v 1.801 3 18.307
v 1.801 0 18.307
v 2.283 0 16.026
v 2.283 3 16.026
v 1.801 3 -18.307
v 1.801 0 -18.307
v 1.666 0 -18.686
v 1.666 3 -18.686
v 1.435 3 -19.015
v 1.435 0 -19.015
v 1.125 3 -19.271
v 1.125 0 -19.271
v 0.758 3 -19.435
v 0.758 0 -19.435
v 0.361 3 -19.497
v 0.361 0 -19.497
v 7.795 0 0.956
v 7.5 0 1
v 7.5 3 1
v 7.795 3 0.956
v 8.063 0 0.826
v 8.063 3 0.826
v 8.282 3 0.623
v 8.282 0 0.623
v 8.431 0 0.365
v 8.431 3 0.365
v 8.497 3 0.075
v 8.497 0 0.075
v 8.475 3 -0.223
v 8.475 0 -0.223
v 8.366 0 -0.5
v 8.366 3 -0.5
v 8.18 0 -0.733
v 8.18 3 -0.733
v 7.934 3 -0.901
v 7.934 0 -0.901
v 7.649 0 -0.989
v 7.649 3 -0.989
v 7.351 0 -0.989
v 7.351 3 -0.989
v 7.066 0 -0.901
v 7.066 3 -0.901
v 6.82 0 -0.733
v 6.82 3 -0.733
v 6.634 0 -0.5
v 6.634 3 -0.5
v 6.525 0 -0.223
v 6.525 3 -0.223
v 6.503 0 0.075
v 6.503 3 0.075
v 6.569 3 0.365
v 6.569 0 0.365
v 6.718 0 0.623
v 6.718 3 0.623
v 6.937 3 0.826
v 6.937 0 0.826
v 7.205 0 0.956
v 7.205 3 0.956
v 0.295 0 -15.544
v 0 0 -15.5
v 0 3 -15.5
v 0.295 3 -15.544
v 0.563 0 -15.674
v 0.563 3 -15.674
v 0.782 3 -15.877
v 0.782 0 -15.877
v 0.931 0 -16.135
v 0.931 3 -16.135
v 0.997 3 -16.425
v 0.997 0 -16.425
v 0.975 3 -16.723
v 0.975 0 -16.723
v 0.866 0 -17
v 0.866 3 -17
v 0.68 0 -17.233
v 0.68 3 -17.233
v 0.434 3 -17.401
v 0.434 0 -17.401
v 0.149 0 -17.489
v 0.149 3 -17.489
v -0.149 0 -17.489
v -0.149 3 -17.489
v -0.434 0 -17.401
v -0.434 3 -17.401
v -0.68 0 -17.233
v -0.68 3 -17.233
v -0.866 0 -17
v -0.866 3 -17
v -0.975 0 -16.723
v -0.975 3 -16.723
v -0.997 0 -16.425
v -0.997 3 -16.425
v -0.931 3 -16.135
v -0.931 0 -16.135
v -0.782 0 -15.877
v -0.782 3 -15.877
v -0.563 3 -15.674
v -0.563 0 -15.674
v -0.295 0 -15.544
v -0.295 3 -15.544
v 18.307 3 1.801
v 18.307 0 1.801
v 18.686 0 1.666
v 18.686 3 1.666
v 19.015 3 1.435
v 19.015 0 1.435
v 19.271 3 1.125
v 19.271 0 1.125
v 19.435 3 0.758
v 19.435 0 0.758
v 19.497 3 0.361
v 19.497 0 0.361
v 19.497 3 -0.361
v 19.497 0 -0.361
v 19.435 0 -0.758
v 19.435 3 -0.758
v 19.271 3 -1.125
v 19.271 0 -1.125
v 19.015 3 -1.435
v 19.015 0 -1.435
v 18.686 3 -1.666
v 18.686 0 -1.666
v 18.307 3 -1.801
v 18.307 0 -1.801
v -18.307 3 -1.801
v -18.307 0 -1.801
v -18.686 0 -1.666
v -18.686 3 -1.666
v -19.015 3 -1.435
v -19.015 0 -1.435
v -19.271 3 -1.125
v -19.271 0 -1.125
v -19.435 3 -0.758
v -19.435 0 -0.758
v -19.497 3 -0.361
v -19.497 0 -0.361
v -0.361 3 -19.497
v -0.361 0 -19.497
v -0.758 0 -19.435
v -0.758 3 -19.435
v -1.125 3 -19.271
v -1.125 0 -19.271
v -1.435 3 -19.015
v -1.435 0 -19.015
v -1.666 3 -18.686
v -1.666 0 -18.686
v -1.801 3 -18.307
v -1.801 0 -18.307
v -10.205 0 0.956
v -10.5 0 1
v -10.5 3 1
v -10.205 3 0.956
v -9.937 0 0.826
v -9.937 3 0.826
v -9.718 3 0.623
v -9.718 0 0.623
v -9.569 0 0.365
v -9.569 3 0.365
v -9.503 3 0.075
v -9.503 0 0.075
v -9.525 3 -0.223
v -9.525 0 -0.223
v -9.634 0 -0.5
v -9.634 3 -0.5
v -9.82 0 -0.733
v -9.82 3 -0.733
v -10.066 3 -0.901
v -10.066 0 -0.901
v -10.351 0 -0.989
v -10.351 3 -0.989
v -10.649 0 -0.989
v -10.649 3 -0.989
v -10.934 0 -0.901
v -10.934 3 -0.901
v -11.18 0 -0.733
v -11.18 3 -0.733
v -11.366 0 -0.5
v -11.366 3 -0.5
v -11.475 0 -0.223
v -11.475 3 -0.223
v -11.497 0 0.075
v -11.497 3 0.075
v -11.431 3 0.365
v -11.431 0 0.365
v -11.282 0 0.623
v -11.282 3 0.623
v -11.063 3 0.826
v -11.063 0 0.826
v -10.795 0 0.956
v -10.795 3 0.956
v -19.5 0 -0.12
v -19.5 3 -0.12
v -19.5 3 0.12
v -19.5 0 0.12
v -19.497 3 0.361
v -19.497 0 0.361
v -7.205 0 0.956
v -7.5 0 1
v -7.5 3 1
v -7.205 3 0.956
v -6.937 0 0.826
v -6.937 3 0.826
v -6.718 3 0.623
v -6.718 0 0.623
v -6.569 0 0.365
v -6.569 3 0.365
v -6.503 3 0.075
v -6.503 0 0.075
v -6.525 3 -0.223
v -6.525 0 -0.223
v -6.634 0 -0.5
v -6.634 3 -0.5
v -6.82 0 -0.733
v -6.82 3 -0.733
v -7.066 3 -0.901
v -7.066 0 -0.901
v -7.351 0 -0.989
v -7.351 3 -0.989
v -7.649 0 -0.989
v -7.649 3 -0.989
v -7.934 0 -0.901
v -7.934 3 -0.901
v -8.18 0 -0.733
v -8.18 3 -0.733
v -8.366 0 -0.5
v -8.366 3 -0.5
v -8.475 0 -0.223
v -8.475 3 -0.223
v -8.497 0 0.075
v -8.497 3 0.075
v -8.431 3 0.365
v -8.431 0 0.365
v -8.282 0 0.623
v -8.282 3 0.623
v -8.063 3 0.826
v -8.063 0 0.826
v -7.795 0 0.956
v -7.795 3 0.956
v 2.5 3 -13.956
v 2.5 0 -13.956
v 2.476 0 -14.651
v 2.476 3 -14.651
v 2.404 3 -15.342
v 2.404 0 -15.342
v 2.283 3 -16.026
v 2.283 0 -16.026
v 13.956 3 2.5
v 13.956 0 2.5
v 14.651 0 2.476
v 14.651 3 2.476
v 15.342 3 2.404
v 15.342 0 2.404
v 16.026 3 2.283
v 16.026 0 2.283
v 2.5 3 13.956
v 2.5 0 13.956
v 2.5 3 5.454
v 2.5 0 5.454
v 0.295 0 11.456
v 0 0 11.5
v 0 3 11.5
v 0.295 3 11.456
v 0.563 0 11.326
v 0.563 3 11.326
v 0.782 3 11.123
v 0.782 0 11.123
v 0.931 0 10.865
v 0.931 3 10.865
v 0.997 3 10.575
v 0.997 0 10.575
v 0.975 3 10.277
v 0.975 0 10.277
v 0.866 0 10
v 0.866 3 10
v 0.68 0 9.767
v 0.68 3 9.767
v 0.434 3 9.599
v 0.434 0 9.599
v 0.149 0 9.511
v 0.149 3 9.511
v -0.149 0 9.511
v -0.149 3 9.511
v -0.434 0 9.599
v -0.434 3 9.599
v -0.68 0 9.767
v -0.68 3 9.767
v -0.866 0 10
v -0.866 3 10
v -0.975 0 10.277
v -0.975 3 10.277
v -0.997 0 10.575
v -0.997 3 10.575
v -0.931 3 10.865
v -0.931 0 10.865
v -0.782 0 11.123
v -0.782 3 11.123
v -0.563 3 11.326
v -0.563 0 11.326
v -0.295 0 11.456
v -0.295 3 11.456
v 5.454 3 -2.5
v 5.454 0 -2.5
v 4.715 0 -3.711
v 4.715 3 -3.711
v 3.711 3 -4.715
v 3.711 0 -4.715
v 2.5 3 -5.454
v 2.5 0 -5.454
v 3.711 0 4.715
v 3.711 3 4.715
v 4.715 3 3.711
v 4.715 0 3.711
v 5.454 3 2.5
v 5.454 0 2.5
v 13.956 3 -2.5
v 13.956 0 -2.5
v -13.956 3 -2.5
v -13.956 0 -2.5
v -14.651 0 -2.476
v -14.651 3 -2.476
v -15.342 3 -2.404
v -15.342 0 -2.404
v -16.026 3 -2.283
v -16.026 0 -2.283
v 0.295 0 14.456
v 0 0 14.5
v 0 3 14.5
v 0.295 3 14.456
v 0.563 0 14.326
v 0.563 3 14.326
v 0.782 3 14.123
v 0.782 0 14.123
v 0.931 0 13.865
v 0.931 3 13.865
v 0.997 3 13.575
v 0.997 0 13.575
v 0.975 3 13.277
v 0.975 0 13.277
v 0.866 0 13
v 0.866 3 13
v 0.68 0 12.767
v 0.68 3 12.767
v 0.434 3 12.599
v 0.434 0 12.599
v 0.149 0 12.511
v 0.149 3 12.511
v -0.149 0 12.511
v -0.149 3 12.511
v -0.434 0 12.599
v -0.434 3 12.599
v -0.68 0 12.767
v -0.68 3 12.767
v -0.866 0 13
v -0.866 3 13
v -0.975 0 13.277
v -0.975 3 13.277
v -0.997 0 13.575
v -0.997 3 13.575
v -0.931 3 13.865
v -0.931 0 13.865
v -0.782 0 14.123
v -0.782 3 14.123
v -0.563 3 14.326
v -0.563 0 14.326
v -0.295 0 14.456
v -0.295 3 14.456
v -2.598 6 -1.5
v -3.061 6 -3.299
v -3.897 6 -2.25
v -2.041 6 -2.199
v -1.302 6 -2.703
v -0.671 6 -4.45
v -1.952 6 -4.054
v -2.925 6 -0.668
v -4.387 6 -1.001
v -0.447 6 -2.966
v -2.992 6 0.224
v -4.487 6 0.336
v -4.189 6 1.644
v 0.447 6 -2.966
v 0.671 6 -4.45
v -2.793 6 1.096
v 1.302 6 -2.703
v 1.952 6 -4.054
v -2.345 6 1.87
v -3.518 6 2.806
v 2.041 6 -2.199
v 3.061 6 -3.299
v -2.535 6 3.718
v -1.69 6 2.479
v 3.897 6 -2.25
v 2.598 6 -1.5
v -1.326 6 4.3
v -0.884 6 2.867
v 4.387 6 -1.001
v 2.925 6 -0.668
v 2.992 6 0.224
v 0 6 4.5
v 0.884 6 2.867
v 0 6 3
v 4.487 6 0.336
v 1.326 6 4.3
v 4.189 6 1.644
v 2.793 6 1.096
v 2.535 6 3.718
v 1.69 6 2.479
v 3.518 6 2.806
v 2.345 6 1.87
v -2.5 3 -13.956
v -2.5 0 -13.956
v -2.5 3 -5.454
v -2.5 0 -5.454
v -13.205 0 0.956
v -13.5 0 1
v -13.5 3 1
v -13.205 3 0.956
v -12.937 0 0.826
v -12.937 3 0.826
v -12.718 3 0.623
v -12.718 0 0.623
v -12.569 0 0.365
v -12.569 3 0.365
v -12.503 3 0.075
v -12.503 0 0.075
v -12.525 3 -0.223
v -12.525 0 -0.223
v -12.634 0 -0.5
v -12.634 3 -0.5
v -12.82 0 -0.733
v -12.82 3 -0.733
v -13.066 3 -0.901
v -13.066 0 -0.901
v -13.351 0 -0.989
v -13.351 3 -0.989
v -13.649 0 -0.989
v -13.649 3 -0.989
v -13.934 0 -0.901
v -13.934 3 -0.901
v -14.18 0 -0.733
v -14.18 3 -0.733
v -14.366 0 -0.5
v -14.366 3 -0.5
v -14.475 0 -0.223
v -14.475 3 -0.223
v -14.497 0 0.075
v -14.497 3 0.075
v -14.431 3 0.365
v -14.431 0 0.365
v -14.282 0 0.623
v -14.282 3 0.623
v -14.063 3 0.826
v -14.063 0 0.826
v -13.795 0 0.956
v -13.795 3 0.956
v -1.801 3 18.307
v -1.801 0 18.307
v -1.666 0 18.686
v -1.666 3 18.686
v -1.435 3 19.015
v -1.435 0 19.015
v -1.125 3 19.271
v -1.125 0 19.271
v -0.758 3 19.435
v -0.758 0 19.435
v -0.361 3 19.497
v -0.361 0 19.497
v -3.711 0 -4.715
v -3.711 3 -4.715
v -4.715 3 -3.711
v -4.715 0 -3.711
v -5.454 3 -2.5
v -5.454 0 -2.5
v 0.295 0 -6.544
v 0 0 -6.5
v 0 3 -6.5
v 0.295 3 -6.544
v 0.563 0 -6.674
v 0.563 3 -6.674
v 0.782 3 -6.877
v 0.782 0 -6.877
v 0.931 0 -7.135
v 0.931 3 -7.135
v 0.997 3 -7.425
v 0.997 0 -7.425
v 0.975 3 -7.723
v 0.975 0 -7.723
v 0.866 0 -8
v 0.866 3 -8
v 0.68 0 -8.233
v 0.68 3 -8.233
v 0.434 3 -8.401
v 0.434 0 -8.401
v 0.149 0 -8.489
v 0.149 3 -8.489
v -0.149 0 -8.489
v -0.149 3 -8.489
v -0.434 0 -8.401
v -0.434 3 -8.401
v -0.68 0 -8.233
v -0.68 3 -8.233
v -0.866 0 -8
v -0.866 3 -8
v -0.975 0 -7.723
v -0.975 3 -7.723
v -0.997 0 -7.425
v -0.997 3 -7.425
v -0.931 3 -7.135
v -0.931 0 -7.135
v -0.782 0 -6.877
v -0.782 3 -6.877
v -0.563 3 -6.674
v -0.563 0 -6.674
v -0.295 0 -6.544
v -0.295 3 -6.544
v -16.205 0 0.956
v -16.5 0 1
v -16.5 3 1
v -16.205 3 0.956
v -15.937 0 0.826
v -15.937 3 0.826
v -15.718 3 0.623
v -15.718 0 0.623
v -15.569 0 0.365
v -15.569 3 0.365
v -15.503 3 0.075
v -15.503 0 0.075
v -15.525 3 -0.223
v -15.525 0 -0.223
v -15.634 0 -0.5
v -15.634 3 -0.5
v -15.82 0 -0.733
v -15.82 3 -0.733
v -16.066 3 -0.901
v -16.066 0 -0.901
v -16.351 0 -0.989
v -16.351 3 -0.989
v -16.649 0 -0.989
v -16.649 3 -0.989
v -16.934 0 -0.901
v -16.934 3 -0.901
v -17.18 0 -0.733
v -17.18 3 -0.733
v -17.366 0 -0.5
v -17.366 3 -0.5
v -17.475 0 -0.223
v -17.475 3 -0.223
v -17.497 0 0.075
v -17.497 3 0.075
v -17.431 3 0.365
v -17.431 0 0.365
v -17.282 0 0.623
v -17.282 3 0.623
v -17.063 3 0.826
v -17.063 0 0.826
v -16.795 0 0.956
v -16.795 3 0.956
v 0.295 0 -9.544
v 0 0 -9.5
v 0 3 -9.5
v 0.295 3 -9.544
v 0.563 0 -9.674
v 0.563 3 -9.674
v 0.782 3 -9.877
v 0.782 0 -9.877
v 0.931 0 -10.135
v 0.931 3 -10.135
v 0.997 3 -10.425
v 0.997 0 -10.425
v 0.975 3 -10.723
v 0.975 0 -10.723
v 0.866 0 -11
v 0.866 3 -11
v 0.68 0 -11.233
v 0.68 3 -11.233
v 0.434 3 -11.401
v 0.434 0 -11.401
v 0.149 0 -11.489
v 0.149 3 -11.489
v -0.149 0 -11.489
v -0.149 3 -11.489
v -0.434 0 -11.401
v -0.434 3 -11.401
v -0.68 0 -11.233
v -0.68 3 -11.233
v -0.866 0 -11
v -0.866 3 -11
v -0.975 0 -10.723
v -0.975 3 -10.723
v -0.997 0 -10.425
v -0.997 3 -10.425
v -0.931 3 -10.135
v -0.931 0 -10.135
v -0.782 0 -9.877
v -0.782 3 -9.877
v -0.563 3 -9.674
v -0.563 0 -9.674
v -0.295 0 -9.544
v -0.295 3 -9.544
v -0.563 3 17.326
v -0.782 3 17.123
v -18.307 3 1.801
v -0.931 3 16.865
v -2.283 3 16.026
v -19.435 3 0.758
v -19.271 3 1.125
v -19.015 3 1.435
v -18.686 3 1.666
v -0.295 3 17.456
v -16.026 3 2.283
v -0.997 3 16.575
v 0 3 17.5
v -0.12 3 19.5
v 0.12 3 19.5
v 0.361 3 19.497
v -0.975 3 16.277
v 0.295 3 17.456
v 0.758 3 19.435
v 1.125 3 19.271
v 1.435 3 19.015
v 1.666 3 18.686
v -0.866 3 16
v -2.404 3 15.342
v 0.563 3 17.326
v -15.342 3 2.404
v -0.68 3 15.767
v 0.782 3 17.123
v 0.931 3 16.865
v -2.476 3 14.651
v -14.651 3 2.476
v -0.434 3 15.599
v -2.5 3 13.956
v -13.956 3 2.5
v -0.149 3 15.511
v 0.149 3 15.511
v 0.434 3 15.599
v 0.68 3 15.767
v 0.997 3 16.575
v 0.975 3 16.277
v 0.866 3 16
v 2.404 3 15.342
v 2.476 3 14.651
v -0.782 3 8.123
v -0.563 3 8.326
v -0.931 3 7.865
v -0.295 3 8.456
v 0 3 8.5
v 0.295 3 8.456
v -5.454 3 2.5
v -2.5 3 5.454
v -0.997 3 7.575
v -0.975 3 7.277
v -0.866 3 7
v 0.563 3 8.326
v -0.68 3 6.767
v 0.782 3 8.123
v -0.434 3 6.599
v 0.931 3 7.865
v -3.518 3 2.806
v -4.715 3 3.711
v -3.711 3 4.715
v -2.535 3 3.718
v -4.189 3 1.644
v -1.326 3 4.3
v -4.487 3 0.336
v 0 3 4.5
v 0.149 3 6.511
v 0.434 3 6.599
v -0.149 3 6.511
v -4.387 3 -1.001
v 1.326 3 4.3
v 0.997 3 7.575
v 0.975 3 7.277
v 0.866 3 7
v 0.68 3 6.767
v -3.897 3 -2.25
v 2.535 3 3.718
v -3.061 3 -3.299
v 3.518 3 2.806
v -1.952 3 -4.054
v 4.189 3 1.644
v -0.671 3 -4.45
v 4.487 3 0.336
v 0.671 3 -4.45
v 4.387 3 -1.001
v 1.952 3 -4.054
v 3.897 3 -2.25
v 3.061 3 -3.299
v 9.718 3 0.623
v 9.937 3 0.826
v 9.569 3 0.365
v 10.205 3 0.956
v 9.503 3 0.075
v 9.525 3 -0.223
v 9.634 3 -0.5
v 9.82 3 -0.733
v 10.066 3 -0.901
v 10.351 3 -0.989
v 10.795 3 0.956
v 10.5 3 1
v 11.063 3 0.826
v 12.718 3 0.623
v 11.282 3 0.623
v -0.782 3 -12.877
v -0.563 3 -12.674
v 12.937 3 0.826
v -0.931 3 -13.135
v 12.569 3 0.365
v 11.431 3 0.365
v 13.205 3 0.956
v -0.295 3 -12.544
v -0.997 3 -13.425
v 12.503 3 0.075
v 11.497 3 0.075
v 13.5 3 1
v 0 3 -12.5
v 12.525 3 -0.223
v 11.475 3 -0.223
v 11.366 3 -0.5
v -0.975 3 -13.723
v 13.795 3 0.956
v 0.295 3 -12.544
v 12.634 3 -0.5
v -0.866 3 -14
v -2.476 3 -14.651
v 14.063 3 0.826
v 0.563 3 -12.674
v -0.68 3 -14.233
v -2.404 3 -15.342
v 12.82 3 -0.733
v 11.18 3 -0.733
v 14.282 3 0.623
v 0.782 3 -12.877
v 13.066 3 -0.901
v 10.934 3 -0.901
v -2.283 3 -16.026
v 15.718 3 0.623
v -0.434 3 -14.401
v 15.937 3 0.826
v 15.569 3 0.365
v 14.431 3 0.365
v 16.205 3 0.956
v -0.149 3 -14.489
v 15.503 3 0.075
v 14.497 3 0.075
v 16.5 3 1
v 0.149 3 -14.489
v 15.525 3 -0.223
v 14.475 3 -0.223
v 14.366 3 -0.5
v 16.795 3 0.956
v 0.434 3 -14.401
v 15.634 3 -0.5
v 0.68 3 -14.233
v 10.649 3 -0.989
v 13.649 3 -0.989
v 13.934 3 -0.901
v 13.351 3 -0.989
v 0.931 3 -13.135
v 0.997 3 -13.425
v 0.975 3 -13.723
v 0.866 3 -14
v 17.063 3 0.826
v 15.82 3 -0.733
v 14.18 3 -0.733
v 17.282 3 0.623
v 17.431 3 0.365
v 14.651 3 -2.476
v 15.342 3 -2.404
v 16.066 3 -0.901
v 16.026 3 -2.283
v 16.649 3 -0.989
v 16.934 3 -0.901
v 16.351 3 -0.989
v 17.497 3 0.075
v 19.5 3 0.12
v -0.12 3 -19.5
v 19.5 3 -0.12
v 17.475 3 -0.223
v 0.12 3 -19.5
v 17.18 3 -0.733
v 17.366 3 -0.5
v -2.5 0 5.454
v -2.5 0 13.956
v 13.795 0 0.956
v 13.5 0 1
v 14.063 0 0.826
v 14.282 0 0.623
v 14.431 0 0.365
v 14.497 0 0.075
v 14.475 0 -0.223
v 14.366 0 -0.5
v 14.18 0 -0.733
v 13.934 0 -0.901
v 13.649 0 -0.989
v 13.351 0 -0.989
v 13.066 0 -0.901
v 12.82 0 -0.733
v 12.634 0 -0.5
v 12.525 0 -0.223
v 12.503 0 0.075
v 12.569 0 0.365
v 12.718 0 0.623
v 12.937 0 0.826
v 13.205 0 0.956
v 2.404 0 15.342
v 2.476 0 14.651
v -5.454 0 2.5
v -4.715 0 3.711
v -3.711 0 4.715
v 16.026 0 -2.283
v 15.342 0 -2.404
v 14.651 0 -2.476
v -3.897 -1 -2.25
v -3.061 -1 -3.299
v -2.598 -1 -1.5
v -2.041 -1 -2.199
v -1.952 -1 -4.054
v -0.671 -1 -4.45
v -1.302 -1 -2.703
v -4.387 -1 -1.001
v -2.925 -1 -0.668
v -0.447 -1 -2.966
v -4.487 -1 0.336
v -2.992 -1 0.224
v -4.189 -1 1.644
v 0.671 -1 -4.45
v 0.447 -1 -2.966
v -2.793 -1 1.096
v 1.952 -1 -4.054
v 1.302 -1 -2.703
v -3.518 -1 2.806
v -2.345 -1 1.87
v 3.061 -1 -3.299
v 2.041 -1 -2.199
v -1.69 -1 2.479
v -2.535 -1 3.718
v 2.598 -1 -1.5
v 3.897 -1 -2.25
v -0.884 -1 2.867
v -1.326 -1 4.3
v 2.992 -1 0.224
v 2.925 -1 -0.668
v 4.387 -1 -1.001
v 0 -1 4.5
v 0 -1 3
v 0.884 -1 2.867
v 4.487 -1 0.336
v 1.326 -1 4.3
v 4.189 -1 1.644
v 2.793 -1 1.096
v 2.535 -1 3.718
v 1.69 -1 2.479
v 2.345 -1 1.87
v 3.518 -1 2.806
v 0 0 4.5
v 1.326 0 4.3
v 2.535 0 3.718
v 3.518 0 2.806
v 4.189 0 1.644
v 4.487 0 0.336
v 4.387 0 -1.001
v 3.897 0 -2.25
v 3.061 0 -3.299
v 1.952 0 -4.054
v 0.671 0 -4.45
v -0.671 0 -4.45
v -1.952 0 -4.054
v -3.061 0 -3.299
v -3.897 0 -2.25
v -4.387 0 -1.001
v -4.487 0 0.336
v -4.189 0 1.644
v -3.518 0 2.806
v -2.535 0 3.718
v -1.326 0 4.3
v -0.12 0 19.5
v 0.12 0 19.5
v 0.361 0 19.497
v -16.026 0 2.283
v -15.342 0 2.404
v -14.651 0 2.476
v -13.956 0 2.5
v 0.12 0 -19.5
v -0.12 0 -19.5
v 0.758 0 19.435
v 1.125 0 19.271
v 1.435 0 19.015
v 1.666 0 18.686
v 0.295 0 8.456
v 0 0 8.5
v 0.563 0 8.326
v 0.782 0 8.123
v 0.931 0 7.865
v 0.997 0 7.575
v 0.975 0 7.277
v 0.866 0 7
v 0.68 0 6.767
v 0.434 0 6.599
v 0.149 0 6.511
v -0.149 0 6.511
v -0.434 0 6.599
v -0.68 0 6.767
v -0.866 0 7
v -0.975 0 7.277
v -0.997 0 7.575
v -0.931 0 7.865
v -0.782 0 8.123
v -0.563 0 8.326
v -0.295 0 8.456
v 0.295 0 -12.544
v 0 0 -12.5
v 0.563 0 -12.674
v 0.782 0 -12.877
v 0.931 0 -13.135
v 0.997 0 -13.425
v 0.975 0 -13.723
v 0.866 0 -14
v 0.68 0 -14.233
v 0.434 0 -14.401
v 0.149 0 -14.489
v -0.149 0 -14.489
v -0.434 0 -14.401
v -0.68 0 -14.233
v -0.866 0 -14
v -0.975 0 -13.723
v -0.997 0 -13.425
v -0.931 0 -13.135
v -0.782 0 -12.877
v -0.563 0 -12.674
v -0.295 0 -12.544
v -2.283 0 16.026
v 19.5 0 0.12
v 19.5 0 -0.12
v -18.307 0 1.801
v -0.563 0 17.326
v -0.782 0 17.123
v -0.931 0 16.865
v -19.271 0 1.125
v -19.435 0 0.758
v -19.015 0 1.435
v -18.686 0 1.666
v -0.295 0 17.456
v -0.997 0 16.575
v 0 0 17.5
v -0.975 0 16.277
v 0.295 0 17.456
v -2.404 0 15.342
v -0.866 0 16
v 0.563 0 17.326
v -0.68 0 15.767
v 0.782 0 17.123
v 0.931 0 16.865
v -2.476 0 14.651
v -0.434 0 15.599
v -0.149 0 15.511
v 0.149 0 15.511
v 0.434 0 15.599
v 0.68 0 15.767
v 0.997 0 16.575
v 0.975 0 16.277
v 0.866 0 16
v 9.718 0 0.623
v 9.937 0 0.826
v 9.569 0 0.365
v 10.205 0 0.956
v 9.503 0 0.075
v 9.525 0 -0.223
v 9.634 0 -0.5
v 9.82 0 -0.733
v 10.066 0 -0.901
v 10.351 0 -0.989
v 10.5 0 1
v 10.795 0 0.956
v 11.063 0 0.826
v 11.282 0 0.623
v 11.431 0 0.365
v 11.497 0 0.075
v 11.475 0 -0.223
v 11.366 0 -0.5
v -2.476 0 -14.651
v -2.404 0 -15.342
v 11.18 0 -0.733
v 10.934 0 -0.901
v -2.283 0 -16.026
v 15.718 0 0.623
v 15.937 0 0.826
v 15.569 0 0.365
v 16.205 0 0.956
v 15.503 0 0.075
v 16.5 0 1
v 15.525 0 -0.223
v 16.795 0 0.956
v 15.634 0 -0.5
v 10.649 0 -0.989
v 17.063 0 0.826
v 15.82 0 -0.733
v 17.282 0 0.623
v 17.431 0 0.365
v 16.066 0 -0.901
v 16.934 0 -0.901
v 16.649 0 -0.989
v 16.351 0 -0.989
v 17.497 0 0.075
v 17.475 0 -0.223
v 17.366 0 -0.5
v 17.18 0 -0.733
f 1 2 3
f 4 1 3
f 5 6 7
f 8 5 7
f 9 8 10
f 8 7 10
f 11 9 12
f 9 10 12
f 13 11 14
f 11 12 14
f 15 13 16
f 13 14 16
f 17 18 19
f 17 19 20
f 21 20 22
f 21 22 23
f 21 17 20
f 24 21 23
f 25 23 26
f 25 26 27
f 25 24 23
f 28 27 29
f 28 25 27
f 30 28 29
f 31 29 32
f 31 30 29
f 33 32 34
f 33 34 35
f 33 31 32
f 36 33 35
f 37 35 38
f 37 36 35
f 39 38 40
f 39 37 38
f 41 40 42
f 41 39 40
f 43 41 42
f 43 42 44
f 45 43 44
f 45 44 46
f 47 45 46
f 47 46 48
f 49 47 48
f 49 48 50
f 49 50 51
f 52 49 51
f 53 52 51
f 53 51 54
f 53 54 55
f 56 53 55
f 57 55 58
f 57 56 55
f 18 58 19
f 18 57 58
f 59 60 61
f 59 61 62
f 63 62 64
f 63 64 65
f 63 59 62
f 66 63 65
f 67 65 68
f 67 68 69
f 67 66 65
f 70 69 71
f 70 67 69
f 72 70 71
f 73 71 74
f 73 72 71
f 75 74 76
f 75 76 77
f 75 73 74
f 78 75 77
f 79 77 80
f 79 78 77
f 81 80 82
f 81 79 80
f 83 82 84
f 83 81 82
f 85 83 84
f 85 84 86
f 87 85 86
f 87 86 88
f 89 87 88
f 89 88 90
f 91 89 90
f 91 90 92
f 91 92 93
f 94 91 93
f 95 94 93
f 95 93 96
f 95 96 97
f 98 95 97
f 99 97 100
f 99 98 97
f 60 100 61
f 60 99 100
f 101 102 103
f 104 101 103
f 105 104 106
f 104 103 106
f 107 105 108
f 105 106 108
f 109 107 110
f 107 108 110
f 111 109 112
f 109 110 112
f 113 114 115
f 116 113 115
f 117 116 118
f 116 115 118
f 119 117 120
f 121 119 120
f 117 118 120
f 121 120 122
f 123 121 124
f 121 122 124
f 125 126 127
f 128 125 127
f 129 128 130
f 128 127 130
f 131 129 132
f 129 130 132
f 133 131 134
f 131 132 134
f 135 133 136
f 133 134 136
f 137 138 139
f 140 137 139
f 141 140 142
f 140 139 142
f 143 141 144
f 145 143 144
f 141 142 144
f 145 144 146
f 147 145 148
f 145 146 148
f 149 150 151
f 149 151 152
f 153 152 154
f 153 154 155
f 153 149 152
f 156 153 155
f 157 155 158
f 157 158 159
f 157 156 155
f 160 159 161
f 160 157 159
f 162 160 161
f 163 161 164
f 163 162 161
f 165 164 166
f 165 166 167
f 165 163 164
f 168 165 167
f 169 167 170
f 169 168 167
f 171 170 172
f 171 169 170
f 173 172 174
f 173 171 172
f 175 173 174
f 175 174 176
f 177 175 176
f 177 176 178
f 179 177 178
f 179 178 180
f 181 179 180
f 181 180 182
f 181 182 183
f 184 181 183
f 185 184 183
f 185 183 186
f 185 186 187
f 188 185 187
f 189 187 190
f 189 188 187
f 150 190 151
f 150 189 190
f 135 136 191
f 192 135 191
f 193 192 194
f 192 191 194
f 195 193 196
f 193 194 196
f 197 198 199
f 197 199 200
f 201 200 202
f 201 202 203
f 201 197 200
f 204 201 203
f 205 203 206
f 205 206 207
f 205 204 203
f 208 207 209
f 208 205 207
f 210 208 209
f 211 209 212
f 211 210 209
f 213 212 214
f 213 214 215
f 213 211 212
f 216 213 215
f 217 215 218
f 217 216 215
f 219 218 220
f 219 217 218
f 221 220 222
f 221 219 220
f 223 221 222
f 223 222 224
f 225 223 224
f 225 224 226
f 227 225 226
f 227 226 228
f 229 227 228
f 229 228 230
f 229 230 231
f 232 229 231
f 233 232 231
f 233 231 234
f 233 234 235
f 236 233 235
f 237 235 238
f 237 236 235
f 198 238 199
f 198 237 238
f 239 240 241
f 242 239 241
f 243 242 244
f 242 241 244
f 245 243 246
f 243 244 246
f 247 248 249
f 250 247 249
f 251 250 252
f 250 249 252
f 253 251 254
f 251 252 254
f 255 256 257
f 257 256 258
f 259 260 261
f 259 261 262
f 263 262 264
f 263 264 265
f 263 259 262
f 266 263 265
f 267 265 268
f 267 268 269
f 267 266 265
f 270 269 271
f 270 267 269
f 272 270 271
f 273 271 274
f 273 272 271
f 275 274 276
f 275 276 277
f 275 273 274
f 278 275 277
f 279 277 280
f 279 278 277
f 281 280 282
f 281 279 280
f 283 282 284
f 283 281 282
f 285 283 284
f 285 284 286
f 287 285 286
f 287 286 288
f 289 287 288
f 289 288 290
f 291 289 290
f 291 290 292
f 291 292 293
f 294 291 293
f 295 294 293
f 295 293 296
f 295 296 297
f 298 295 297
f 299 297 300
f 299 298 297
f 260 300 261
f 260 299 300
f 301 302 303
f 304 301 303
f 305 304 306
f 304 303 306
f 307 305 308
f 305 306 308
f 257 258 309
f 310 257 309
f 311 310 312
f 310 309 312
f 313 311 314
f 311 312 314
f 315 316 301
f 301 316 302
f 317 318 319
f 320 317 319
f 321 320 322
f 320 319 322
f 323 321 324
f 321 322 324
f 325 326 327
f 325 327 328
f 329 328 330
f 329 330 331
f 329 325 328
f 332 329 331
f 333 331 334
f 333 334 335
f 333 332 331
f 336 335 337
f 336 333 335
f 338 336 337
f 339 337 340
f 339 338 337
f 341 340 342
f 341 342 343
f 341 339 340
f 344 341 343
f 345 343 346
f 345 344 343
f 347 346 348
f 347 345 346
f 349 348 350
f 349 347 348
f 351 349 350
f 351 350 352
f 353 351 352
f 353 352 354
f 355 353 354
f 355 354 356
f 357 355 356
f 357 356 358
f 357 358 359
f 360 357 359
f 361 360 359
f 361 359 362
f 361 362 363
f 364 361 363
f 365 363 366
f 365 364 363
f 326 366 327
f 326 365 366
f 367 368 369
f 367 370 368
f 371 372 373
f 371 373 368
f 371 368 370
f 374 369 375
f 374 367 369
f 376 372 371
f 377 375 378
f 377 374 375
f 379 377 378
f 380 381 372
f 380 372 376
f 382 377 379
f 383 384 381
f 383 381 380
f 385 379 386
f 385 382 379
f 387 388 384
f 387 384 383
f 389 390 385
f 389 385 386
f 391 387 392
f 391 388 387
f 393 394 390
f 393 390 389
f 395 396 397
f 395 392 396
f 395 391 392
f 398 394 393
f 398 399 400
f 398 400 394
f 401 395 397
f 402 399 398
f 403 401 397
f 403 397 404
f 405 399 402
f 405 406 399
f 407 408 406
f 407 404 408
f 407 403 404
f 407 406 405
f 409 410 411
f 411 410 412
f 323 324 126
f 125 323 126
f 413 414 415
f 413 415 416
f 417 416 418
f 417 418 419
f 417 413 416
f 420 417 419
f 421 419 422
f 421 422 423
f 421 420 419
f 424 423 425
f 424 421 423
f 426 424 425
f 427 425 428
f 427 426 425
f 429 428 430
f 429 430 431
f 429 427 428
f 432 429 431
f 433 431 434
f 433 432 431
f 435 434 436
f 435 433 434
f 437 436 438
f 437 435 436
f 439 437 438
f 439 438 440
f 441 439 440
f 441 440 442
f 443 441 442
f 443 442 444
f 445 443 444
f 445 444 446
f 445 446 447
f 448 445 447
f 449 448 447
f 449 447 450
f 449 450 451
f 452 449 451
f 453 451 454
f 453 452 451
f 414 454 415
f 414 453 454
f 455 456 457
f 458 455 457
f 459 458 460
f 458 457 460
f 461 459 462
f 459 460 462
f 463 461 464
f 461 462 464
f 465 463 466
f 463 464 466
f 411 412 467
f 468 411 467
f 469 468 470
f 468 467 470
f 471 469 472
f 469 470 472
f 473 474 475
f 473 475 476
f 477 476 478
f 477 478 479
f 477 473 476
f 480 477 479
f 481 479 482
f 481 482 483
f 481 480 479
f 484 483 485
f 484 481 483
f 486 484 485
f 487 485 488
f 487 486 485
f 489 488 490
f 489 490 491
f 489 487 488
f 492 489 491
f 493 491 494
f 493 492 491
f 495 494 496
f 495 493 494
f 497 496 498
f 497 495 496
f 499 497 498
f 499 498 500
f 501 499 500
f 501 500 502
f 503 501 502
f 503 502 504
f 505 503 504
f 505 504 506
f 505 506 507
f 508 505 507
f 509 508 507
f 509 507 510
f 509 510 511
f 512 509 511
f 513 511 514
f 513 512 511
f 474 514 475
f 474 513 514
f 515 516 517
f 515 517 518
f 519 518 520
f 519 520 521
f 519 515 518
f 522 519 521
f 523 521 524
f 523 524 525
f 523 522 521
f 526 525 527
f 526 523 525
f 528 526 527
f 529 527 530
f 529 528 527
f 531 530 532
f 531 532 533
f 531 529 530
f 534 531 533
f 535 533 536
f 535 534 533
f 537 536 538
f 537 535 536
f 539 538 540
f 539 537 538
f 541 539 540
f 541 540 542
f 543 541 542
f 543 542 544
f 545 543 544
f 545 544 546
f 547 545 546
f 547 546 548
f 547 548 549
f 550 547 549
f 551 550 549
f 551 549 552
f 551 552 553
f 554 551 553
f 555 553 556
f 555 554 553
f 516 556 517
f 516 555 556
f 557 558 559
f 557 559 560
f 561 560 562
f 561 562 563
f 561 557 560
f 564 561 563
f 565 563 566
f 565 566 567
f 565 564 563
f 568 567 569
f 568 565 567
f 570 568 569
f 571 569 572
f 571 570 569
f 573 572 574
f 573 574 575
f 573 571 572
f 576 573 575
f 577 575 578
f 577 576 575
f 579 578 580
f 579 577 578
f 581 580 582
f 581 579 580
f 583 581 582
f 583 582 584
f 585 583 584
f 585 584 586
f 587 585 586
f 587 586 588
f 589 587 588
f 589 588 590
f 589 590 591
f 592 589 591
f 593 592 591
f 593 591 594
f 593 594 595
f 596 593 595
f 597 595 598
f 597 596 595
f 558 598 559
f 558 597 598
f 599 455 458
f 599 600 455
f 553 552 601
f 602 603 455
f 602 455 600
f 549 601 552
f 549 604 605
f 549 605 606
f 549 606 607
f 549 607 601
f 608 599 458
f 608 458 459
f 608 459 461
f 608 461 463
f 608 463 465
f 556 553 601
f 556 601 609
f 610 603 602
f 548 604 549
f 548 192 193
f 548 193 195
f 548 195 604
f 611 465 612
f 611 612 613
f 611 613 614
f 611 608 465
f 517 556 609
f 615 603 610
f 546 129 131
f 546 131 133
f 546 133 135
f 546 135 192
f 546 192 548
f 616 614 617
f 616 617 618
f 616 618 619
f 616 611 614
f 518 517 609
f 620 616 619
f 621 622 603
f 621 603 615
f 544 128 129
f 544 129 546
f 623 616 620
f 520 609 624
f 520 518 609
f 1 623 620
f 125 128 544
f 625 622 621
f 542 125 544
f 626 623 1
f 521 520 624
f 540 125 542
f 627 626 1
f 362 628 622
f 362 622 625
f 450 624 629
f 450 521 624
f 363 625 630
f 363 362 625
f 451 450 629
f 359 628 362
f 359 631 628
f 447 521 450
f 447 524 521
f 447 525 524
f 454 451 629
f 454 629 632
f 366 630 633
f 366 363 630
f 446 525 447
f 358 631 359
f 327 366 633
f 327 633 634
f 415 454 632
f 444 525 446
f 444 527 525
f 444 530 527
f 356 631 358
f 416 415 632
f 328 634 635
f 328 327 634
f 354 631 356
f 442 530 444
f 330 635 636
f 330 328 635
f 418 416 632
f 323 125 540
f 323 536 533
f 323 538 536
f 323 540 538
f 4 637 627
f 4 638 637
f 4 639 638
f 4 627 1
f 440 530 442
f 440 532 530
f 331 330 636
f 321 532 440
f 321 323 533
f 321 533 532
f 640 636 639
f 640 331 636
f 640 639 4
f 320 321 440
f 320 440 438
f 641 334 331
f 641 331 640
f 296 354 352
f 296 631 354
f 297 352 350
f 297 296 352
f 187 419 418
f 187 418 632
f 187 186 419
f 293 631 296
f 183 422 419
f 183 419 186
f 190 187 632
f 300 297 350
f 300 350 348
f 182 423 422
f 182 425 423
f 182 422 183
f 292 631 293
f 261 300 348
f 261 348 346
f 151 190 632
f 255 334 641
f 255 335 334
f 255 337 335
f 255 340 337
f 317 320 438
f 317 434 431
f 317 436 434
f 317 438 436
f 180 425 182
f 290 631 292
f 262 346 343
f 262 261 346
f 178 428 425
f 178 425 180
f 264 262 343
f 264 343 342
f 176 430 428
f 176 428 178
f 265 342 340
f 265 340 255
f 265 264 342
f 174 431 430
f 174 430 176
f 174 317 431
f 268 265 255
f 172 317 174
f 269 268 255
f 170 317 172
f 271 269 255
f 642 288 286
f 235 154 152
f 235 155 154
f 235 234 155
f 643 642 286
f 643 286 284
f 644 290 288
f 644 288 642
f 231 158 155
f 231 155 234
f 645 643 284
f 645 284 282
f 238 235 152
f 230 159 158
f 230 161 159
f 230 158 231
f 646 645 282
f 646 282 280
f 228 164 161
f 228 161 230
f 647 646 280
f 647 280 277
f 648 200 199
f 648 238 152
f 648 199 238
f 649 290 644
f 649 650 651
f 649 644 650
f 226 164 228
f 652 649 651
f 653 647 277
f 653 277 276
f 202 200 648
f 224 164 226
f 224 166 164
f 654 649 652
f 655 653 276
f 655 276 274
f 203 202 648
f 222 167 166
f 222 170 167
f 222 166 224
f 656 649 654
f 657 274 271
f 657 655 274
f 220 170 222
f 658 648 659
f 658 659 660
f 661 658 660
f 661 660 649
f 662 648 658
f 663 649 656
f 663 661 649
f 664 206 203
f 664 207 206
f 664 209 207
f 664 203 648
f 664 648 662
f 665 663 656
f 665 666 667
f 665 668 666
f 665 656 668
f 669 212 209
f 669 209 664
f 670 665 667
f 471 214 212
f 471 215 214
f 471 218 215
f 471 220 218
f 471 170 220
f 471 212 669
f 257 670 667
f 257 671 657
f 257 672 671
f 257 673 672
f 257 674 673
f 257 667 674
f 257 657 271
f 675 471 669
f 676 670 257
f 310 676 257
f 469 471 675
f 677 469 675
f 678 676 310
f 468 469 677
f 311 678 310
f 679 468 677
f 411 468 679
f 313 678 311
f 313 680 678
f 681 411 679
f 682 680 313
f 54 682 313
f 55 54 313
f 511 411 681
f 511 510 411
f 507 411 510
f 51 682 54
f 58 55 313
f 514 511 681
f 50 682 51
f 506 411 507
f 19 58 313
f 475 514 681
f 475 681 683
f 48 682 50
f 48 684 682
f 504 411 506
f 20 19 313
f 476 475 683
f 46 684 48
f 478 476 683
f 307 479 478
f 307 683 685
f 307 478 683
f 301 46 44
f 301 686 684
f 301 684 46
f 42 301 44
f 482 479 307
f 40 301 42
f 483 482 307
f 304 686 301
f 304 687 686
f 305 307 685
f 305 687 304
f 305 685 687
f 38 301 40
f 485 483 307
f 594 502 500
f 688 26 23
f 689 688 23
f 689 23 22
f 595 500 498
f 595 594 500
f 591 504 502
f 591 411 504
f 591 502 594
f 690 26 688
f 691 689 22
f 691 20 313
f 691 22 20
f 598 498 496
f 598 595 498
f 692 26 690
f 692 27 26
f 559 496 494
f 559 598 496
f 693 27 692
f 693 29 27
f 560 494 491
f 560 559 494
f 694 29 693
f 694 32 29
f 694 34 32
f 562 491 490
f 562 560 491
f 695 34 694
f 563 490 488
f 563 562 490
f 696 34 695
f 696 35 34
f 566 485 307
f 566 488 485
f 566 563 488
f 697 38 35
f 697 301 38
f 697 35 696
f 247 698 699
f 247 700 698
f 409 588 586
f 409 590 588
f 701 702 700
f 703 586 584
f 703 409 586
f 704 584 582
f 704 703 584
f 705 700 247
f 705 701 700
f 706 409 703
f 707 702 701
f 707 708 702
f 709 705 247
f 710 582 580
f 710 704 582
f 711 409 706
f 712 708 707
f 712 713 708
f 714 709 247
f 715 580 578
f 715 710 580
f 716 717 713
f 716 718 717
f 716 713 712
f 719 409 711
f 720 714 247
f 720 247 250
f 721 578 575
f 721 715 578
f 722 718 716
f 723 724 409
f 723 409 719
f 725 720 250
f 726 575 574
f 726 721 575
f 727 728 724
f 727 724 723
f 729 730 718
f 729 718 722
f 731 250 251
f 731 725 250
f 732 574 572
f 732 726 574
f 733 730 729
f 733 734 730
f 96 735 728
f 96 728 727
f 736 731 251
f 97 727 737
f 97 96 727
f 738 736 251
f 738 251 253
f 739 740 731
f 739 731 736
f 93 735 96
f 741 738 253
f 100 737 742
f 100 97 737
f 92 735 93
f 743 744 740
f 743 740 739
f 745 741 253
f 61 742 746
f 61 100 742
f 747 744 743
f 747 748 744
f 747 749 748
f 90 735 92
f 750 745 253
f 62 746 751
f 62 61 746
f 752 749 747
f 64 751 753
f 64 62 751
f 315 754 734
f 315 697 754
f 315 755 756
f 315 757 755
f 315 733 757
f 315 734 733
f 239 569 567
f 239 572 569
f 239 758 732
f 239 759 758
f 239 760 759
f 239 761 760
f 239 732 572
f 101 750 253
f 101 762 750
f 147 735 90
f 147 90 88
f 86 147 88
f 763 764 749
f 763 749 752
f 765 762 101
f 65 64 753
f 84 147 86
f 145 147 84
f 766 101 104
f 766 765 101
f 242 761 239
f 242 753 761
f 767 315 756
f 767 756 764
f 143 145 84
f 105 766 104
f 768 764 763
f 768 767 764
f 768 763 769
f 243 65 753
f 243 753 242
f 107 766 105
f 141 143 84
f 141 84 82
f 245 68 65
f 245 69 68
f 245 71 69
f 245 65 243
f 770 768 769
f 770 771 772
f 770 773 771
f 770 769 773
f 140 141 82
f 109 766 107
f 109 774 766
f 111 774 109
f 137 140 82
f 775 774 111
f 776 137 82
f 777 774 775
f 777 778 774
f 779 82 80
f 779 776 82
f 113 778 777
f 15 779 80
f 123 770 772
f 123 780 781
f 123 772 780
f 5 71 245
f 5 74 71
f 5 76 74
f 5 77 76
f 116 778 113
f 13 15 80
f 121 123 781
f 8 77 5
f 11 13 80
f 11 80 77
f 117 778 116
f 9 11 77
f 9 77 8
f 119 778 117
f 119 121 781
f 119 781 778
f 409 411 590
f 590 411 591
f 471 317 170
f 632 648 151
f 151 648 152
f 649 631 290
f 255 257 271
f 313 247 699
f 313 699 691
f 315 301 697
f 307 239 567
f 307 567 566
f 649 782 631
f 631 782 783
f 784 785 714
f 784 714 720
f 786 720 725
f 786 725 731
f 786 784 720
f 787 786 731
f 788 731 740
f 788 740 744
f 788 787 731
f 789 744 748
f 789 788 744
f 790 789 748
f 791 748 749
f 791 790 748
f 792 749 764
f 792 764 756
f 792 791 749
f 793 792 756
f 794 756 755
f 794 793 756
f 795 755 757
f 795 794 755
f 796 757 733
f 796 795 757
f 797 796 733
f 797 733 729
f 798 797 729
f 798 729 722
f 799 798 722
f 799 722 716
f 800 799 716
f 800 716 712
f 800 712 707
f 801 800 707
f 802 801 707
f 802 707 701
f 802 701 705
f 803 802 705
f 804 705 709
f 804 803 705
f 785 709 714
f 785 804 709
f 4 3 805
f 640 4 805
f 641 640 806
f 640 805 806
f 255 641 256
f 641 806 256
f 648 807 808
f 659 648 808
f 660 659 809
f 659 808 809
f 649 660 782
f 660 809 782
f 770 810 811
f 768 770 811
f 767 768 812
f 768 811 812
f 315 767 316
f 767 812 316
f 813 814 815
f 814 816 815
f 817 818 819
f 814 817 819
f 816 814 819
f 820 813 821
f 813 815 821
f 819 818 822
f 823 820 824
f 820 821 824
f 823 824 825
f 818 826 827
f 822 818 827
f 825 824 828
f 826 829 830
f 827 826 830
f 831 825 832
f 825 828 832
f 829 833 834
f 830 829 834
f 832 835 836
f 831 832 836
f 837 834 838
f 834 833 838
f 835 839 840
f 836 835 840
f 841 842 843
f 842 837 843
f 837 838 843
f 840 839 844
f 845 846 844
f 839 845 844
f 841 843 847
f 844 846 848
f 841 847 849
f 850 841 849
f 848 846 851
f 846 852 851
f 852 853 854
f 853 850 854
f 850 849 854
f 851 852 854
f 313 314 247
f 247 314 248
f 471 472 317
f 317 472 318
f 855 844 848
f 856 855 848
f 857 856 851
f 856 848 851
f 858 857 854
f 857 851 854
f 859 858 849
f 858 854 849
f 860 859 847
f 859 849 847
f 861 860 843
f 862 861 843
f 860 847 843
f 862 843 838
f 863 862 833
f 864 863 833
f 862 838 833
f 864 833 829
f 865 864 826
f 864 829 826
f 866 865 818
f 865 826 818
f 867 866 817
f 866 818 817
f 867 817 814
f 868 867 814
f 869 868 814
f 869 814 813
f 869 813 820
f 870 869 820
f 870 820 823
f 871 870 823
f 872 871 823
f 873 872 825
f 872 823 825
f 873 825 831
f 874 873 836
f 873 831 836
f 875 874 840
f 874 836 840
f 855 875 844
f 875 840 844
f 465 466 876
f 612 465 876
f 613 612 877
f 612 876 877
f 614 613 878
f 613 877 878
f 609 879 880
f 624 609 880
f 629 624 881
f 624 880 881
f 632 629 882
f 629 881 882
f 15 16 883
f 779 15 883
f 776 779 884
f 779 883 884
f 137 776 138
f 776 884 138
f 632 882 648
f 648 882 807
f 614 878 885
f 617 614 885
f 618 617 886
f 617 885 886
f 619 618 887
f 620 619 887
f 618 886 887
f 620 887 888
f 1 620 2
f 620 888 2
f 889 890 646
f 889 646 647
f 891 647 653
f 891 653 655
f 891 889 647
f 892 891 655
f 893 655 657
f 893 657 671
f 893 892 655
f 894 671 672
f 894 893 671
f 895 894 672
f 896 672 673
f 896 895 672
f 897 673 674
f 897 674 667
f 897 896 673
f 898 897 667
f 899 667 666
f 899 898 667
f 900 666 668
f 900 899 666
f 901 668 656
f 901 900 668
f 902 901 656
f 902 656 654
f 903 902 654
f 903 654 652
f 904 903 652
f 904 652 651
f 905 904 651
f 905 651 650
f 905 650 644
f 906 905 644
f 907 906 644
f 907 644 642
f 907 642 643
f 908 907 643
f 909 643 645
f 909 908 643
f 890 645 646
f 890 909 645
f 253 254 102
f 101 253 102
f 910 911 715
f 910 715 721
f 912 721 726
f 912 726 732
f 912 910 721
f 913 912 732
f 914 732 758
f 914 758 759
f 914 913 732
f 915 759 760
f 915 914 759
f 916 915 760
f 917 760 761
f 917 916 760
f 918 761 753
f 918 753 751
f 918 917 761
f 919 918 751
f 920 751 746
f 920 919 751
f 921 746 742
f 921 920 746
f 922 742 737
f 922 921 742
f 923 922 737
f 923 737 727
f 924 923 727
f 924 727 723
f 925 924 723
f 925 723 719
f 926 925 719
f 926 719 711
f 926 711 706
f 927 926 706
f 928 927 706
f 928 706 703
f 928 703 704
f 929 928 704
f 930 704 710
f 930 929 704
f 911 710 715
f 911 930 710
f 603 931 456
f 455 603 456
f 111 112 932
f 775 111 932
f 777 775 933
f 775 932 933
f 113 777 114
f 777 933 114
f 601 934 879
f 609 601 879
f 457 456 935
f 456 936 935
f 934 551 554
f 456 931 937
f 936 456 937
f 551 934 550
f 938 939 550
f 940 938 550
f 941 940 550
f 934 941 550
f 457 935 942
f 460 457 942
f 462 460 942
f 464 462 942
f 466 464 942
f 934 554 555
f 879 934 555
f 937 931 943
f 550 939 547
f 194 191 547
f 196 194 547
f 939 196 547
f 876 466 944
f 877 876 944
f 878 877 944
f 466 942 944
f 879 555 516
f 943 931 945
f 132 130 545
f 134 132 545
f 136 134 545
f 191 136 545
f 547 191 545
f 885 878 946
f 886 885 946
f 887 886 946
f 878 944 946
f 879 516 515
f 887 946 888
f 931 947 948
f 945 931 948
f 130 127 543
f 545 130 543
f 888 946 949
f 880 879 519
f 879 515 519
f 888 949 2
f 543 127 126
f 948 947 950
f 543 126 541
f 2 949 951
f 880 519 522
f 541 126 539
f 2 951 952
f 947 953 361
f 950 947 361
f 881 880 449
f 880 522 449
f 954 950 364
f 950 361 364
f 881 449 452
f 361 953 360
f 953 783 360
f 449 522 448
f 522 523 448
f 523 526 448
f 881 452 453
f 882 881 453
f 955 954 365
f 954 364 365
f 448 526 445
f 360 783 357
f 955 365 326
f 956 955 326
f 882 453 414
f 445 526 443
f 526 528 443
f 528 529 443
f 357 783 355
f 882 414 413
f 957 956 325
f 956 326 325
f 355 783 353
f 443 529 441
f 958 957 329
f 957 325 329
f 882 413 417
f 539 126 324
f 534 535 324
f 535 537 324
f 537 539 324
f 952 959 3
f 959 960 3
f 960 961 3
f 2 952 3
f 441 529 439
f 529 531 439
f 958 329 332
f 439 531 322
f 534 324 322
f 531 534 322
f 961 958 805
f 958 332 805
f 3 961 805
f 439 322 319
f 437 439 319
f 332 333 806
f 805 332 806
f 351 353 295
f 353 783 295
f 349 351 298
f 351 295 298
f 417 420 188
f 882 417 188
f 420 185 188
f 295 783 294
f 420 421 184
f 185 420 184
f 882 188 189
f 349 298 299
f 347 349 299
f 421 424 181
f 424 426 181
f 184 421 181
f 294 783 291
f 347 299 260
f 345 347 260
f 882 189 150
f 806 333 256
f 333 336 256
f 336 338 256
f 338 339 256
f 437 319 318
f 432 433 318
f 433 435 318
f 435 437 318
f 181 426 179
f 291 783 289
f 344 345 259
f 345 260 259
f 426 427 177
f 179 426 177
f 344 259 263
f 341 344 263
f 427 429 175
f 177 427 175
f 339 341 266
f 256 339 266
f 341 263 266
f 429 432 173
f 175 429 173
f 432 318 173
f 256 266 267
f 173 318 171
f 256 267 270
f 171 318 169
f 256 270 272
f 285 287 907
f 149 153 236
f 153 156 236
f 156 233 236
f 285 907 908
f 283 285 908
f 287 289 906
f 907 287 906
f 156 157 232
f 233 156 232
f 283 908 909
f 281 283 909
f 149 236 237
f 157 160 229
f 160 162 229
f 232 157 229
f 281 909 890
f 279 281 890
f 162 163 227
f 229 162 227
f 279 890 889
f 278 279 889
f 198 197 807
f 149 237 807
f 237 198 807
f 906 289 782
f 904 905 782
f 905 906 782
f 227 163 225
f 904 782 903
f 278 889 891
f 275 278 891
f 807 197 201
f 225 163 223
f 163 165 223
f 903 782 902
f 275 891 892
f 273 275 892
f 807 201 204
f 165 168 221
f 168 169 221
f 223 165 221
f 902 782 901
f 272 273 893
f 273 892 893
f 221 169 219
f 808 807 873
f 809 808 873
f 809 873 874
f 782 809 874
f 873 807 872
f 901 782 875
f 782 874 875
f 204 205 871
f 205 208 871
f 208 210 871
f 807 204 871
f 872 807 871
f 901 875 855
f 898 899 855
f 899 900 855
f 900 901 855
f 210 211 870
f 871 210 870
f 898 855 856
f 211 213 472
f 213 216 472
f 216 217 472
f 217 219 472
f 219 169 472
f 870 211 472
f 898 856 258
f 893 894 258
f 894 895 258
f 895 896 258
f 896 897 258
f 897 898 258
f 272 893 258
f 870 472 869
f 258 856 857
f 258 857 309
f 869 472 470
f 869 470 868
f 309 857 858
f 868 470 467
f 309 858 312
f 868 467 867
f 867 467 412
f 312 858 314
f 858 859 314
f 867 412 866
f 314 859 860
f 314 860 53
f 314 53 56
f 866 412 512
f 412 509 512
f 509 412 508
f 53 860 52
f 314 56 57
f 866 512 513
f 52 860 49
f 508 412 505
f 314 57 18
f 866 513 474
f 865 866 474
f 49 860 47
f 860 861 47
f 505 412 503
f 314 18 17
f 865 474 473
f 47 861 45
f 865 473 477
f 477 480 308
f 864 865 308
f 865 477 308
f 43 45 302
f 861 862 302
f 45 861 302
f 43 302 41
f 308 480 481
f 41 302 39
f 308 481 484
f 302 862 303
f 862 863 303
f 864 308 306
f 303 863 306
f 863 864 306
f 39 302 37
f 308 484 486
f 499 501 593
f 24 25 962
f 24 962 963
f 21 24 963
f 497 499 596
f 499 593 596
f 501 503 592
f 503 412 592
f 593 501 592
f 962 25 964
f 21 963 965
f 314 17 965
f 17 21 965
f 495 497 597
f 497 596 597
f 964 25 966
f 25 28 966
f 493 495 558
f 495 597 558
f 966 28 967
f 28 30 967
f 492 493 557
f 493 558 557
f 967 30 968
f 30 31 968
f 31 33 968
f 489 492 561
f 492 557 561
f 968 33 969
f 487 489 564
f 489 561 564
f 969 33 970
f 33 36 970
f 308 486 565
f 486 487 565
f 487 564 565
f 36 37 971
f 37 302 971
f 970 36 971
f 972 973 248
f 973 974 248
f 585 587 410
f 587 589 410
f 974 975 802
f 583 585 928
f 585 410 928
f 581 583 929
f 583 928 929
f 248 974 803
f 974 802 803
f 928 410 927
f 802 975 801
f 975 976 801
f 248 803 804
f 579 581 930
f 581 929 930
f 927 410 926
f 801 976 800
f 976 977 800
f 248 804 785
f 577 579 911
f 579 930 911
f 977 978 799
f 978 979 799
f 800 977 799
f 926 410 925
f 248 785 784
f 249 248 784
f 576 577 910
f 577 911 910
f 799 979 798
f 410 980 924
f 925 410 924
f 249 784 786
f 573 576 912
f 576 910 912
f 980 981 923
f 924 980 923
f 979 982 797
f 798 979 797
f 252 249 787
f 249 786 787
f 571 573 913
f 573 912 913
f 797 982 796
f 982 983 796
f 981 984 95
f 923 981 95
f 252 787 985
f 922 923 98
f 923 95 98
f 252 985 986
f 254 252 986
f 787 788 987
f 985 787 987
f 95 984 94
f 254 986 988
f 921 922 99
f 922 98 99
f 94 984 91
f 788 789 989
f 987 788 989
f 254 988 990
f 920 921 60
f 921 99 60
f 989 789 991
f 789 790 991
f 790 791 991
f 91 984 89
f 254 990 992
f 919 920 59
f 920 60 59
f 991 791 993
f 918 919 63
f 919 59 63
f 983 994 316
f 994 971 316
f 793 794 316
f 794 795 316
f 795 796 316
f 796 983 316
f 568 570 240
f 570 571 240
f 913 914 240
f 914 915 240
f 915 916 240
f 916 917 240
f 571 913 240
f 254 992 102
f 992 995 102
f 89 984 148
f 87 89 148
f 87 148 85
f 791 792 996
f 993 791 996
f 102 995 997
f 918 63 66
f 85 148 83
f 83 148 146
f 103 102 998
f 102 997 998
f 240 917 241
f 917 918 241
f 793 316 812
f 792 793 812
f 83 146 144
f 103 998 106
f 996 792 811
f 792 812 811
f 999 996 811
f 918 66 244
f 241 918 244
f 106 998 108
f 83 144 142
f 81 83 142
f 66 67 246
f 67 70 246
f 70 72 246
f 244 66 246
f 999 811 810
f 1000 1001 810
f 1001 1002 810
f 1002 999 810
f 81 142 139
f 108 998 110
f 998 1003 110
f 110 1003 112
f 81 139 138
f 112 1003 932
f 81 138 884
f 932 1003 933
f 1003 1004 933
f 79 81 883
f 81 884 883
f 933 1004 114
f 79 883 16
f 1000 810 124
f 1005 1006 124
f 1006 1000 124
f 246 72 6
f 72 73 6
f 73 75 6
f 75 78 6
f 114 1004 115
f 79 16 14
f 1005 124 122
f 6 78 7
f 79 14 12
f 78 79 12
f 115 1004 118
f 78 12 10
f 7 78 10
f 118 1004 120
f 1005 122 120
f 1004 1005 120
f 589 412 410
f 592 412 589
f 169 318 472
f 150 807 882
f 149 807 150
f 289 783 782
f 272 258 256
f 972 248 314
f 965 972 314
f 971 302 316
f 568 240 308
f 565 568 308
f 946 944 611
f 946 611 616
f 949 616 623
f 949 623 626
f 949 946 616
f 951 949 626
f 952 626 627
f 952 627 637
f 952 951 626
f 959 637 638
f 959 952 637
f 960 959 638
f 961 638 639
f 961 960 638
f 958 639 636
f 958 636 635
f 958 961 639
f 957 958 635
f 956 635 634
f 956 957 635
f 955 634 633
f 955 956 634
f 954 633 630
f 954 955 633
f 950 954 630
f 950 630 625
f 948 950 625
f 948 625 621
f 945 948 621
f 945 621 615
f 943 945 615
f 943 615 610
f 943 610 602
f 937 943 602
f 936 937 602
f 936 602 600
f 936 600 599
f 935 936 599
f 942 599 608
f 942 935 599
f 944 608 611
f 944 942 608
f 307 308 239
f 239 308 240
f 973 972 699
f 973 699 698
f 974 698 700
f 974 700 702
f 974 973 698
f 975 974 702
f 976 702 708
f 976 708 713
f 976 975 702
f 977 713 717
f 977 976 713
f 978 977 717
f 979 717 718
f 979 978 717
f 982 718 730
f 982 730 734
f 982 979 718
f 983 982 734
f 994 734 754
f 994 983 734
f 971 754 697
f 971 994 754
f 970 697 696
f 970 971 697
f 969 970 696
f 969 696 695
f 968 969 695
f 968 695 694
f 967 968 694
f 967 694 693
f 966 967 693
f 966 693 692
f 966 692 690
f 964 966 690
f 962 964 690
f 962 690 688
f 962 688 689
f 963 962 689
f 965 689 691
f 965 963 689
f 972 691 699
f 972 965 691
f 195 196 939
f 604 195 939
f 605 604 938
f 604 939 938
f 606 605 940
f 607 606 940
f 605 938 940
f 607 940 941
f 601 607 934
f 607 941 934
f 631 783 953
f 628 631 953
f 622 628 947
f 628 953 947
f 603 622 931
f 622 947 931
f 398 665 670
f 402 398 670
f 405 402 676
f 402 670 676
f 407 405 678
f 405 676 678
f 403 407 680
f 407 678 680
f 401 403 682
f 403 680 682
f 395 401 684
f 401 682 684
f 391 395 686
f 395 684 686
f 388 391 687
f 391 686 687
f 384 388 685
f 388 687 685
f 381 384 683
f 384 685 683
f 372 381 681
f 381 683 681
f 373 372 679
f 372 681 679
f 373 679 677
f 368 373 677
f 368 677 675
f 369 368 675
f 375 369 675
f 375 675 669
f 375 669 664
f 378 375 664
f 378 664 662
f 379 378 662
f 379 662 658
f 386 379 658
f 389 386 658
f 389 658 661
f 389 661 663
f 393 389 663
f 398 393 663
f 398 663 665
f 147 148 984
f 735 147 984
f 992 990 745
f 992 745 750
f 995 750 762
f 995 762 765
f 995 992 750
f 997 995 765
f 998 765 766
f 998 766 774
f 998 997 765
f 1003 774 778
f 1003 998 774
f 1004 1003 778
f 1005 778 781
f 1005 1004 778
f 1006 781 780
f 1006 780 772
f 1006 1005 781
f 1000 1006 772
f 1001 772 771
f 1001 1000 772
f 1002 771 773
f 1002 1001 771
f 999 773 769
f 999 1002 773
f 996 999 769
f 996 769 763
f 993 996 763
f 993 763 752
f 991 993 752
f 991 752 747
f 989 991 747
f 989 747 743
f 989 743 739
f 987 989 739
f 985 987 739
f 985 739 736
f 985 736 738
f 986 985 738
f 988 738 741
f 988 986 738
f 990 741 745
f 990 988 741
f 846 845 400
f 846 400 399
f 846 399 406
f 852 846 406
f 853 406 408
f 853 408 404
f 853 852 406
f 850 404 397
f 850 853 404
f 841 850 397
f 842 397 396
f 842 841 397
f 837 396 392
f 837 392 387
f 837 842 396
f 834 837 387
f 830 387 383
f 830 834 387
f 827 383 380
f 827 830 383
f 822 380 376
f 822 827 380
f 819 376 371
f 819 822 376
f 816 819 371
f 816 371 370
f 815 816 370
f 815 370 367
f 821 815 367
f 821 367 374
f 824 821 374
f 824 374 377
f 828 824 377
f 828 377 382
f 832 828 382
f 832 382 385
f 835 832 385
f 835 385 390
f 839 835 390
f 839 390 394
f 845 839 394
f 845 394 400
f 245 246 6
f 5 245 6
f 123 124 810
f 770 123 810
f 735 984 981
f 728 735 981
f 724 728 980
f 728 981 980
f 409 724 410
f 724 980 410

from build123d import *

# Parameters (mm, degrees)
SKETCH1_R           = 1
SKETCH1_R_2         = 4.5
BOSS_EXTRUDE1_DEPTH = 3
SKETCH1_4_R         = 4.5
SKETCH1_4_R_2       = 3
BOSS_EXTRUDE2_DEPTH = 6
BOSS_EXTRUDE3_START = -1
SKETCH1_5_R         = 4.5
SKETCH1_5_R_2       = 3
BOSS_EXTRUDE3_DEPTH = 1


with BuildPart() as part:
    # Sketch1 → Boss-Extrude1 (new body)
    with BuildSketch(Plane(origin=(0, 0, 0), x_dir=(1, 0, 0), z_dir=(0, 1, 0))):
        with BuildLine():
            ThreePointArc((-0.360965573, 19.496658787), (-1.288456839, 19.153411563), (-1.800704436, 18.307444008))
            Line((-1.800704436, 18.307444008), (-2.283369641, 16.026447288))
            ThreePointArc((-2.283369641, 16.026447288), (-2.445694958, 14.997005048), (-2.5, 13.956259259))
            Line((-2.5, 13.956259259), (-2.5, 5.454356057))
            ThreePointArc((-2.5, 5.454356057), (-4.242640687, 4.242640687), (-5.454356057, 2.5))
            Line((-5.454356057, 2.5), (-13.956259259, 2.5))
            ThreePointArc((-13.956259259, 2.5), (-14.997005048, 2.445694958), (-16.026447288, 2.283369641))
            Line((-16.026447288, 2.283369641), (-18.307444008, 1.800704436))
            ThreePointArc((-18.307444008, 1.800704436), (-19.153411563, 1.288456839), (-19.496658787, 0.360965573))
            ThreePointArc((-19.496658787, 0.360965573), (-19.5, 0), (-19.496658787, -0.360965573))
            ThreePointArc((-19.496658787, -0.360965573), (-19.153411563, -1.288456839), (-18.307444008, -1.800704436))
            Line((-18.307444008, -1.800704436), (-16.026447288, -2.283369641))
            ThreePointArc((-16.026447288, -2.283369641), (-14.997005048, -2.445694958), (-13.956259259, -2.5))
            Line((-13.956259259, -2.5), (-5.454356057, -2.5))
            ThreePointArc((-5.454356057, -2.5), (-4.242640687, -4.242640687), (-2.5, -5.454356057))
            Line((-2.5, -5.454356057), (-2.5, -13.956259259))
            ThreePointArc((-2.5, -13.956259259), (-2.445694958, -14.997005048), (-2.283369641, -16.026447288))
            Line((-2.283369641, -16.026447288), (-1.800704436, -18.307444008))
            ThreePointArc((-1.800704436, -18.307444008), (-1.288456839, -19.153411563), (-0.360965573, -19.496658787))
            ThreePointArc((-0.360965573, -19.496658787), (0, -19.5), (0.360965573, -19.496658787))
            ThreePointArc((0.360965573, -19.496658787), (1.288456839, -19.153411563), (1.800704436, -18.307444008))
            Line((1.800704436, -18.307444008), (2.283369641, -16.026447288))
            ThreePointArc((2.283369641, -16.026447288), (2.445694958, -14.997005048), (2.5, -13.956259259))
            Line((2.5, -13.956259259), (2.5, -5.454356057))
            ThreePointArc((2.5, -5.454356057), (4.242640687, -4.242640687), (5.454356057, -2.5))
            Line((5.454356057, -2.5), (13.956259259, -2.5))
            ThreePointArc((13.956259259, -2.5), (14.997005048, -2.445694958), (16.026447288, -2.283369641))
            Line((16.026447288, -2.283369641), (18.307444008, -1.800704436))
            ThreePointArc((18.307444008, -1.800704436), (19.153411563, -1.288456839), (19.496658787, -0.360965573))
            ThreePointArc((19.496658787, -0.360965573), (19.5, 0), (19.496658787, 0.360965573))
            ThreePointArc((19.496658787, 0.360965573), (19.153411563, 1.288456839), (18.307444008, 1.800704436))
            Line((18.307444008, 1.800704436), (16.026447288, 2.283369641))
            ThreePointArc((16.026447288, 2.283369641), (14.997005048, 2.445694958), (13.956259259, 2.5))
            Line((13.956259259, 2.5), (5.454356057, 2.5))
            ThreePointArc((5.454356057, 2.5), (4.242640687, 4.242640687), (2.5, 5.454356057))
            Line((2.5, 5.454356057), (2.5, 13.956259259))
            ThreePointArc((2.5, 13.956259259), (2.445694958, 14.997005048), (2.283369641, 16.026447288))
            Line((2.283369641, 16.026447288), (1.800704436, 18.307444008))
            ThreePointArc((1.800704436, 18.307444008), (1.288456839, 19.153411563), (0.360965573, 19.496658787))
            ThreePointArc((0.360965573, 19.496658787), (0, 19.5), (-0.360965573, 19.496658787))
        make_face()
        with Locations((-16.5, 0)):
            Circle(SKETCH1_R, mode=Mode.SUBTRACT)
        with Locations((-13.5, 0)):
            Circle(SKETCH1_R, mode=Mode.SUBTRACT)
        with Locations((-10.5, 0)):
            Circle(SKETCH1_R, mode=Mode.SUBTRACT)
        with Locations((-7.5, 0)):
            Circle(SKETCH1_R, mode=Mode.SUBTRACT)
        with Locations((0, -16.5)):
            Circle(SKETCH1_R, mode=Mode.SUBTRACT)
        with Locations((0, -13.5)):
            Circle(SKETCH1_R, mode=Mode.SUBTRACT)
        with Locations((0, -10.5)):
            Circle(SKETCH1_R, mode=Mode.SUBTRACT)
        with Locations((0, -7.5)):
            Circle(SKETCH1_R, mode=Mode.SUBTRACT)
        Circle(SKETCH1_R_2, mode=Mode.SUBTRACT)
        with Locations((7.5, 0)):
            Circle(SKETCH1_R, mode=Mode.SUBTRACT)
        with Locations((0, 7.5)):
            Circle(SKETCH1_R, mode=Mode.SUBTRACT)
        with Locations((10.5, 0)):
            Circle(SKETCH1_R, mode=Mode.SUBTRACT)
        with Locations((13.5, 0)):
            Circle(SKETCH1_R, mode=Mode.SUBTRACT)
        with Locations((16.5, 0)):
            Circle(SKETCH1_R, mode=Mode.SUBTRACT)
        with Locations((0, 10.5)):
            Circle(SKETCH1_R, mode=Mode.SUBTRACT)
        with Locations((0, 13.5)):
            Circle(SKETCH1_R, mode=Mode.SUBTRACT)
        with Locations((0, 16.5)):
            Circle(SKETCH1_R, mode=Mode.SUBTRACT)
    extrude(amount=BOSS_EXTRUDE1_DEPTH)

    # Sketch1<4> → Boss-Extrude2 (add)
    with BuildSketch(Plane(origin=(0, 0, 0), x_dir=(1, 0, 0), z_dir=(0, 1, 0))):
        Circle(SKETCH1_4_R)
        Circle(SKETCH1_4_R_2, mode=Mode.SUBTRACT)
    extrude(amount=BOSS_EXTRUDE2_DEPTH)

    # Sketch1<5> → Boss-Extrude3 (add)
    with BuildSketch(Plane(origin=(0, 0, 0), x_dir=(1, 0, 0), z_dir=(0, 1, 0)).offset(BOSS_EXTRUDE3_START)):
        Circle(SKETCH1_5_R)
        Circle(SKETCH1_5_R_2, mode=Mode.SUBTRACT)
    extrude(amount=BOSS_EXTRUDE3_DEPTH)


solid = part.part
